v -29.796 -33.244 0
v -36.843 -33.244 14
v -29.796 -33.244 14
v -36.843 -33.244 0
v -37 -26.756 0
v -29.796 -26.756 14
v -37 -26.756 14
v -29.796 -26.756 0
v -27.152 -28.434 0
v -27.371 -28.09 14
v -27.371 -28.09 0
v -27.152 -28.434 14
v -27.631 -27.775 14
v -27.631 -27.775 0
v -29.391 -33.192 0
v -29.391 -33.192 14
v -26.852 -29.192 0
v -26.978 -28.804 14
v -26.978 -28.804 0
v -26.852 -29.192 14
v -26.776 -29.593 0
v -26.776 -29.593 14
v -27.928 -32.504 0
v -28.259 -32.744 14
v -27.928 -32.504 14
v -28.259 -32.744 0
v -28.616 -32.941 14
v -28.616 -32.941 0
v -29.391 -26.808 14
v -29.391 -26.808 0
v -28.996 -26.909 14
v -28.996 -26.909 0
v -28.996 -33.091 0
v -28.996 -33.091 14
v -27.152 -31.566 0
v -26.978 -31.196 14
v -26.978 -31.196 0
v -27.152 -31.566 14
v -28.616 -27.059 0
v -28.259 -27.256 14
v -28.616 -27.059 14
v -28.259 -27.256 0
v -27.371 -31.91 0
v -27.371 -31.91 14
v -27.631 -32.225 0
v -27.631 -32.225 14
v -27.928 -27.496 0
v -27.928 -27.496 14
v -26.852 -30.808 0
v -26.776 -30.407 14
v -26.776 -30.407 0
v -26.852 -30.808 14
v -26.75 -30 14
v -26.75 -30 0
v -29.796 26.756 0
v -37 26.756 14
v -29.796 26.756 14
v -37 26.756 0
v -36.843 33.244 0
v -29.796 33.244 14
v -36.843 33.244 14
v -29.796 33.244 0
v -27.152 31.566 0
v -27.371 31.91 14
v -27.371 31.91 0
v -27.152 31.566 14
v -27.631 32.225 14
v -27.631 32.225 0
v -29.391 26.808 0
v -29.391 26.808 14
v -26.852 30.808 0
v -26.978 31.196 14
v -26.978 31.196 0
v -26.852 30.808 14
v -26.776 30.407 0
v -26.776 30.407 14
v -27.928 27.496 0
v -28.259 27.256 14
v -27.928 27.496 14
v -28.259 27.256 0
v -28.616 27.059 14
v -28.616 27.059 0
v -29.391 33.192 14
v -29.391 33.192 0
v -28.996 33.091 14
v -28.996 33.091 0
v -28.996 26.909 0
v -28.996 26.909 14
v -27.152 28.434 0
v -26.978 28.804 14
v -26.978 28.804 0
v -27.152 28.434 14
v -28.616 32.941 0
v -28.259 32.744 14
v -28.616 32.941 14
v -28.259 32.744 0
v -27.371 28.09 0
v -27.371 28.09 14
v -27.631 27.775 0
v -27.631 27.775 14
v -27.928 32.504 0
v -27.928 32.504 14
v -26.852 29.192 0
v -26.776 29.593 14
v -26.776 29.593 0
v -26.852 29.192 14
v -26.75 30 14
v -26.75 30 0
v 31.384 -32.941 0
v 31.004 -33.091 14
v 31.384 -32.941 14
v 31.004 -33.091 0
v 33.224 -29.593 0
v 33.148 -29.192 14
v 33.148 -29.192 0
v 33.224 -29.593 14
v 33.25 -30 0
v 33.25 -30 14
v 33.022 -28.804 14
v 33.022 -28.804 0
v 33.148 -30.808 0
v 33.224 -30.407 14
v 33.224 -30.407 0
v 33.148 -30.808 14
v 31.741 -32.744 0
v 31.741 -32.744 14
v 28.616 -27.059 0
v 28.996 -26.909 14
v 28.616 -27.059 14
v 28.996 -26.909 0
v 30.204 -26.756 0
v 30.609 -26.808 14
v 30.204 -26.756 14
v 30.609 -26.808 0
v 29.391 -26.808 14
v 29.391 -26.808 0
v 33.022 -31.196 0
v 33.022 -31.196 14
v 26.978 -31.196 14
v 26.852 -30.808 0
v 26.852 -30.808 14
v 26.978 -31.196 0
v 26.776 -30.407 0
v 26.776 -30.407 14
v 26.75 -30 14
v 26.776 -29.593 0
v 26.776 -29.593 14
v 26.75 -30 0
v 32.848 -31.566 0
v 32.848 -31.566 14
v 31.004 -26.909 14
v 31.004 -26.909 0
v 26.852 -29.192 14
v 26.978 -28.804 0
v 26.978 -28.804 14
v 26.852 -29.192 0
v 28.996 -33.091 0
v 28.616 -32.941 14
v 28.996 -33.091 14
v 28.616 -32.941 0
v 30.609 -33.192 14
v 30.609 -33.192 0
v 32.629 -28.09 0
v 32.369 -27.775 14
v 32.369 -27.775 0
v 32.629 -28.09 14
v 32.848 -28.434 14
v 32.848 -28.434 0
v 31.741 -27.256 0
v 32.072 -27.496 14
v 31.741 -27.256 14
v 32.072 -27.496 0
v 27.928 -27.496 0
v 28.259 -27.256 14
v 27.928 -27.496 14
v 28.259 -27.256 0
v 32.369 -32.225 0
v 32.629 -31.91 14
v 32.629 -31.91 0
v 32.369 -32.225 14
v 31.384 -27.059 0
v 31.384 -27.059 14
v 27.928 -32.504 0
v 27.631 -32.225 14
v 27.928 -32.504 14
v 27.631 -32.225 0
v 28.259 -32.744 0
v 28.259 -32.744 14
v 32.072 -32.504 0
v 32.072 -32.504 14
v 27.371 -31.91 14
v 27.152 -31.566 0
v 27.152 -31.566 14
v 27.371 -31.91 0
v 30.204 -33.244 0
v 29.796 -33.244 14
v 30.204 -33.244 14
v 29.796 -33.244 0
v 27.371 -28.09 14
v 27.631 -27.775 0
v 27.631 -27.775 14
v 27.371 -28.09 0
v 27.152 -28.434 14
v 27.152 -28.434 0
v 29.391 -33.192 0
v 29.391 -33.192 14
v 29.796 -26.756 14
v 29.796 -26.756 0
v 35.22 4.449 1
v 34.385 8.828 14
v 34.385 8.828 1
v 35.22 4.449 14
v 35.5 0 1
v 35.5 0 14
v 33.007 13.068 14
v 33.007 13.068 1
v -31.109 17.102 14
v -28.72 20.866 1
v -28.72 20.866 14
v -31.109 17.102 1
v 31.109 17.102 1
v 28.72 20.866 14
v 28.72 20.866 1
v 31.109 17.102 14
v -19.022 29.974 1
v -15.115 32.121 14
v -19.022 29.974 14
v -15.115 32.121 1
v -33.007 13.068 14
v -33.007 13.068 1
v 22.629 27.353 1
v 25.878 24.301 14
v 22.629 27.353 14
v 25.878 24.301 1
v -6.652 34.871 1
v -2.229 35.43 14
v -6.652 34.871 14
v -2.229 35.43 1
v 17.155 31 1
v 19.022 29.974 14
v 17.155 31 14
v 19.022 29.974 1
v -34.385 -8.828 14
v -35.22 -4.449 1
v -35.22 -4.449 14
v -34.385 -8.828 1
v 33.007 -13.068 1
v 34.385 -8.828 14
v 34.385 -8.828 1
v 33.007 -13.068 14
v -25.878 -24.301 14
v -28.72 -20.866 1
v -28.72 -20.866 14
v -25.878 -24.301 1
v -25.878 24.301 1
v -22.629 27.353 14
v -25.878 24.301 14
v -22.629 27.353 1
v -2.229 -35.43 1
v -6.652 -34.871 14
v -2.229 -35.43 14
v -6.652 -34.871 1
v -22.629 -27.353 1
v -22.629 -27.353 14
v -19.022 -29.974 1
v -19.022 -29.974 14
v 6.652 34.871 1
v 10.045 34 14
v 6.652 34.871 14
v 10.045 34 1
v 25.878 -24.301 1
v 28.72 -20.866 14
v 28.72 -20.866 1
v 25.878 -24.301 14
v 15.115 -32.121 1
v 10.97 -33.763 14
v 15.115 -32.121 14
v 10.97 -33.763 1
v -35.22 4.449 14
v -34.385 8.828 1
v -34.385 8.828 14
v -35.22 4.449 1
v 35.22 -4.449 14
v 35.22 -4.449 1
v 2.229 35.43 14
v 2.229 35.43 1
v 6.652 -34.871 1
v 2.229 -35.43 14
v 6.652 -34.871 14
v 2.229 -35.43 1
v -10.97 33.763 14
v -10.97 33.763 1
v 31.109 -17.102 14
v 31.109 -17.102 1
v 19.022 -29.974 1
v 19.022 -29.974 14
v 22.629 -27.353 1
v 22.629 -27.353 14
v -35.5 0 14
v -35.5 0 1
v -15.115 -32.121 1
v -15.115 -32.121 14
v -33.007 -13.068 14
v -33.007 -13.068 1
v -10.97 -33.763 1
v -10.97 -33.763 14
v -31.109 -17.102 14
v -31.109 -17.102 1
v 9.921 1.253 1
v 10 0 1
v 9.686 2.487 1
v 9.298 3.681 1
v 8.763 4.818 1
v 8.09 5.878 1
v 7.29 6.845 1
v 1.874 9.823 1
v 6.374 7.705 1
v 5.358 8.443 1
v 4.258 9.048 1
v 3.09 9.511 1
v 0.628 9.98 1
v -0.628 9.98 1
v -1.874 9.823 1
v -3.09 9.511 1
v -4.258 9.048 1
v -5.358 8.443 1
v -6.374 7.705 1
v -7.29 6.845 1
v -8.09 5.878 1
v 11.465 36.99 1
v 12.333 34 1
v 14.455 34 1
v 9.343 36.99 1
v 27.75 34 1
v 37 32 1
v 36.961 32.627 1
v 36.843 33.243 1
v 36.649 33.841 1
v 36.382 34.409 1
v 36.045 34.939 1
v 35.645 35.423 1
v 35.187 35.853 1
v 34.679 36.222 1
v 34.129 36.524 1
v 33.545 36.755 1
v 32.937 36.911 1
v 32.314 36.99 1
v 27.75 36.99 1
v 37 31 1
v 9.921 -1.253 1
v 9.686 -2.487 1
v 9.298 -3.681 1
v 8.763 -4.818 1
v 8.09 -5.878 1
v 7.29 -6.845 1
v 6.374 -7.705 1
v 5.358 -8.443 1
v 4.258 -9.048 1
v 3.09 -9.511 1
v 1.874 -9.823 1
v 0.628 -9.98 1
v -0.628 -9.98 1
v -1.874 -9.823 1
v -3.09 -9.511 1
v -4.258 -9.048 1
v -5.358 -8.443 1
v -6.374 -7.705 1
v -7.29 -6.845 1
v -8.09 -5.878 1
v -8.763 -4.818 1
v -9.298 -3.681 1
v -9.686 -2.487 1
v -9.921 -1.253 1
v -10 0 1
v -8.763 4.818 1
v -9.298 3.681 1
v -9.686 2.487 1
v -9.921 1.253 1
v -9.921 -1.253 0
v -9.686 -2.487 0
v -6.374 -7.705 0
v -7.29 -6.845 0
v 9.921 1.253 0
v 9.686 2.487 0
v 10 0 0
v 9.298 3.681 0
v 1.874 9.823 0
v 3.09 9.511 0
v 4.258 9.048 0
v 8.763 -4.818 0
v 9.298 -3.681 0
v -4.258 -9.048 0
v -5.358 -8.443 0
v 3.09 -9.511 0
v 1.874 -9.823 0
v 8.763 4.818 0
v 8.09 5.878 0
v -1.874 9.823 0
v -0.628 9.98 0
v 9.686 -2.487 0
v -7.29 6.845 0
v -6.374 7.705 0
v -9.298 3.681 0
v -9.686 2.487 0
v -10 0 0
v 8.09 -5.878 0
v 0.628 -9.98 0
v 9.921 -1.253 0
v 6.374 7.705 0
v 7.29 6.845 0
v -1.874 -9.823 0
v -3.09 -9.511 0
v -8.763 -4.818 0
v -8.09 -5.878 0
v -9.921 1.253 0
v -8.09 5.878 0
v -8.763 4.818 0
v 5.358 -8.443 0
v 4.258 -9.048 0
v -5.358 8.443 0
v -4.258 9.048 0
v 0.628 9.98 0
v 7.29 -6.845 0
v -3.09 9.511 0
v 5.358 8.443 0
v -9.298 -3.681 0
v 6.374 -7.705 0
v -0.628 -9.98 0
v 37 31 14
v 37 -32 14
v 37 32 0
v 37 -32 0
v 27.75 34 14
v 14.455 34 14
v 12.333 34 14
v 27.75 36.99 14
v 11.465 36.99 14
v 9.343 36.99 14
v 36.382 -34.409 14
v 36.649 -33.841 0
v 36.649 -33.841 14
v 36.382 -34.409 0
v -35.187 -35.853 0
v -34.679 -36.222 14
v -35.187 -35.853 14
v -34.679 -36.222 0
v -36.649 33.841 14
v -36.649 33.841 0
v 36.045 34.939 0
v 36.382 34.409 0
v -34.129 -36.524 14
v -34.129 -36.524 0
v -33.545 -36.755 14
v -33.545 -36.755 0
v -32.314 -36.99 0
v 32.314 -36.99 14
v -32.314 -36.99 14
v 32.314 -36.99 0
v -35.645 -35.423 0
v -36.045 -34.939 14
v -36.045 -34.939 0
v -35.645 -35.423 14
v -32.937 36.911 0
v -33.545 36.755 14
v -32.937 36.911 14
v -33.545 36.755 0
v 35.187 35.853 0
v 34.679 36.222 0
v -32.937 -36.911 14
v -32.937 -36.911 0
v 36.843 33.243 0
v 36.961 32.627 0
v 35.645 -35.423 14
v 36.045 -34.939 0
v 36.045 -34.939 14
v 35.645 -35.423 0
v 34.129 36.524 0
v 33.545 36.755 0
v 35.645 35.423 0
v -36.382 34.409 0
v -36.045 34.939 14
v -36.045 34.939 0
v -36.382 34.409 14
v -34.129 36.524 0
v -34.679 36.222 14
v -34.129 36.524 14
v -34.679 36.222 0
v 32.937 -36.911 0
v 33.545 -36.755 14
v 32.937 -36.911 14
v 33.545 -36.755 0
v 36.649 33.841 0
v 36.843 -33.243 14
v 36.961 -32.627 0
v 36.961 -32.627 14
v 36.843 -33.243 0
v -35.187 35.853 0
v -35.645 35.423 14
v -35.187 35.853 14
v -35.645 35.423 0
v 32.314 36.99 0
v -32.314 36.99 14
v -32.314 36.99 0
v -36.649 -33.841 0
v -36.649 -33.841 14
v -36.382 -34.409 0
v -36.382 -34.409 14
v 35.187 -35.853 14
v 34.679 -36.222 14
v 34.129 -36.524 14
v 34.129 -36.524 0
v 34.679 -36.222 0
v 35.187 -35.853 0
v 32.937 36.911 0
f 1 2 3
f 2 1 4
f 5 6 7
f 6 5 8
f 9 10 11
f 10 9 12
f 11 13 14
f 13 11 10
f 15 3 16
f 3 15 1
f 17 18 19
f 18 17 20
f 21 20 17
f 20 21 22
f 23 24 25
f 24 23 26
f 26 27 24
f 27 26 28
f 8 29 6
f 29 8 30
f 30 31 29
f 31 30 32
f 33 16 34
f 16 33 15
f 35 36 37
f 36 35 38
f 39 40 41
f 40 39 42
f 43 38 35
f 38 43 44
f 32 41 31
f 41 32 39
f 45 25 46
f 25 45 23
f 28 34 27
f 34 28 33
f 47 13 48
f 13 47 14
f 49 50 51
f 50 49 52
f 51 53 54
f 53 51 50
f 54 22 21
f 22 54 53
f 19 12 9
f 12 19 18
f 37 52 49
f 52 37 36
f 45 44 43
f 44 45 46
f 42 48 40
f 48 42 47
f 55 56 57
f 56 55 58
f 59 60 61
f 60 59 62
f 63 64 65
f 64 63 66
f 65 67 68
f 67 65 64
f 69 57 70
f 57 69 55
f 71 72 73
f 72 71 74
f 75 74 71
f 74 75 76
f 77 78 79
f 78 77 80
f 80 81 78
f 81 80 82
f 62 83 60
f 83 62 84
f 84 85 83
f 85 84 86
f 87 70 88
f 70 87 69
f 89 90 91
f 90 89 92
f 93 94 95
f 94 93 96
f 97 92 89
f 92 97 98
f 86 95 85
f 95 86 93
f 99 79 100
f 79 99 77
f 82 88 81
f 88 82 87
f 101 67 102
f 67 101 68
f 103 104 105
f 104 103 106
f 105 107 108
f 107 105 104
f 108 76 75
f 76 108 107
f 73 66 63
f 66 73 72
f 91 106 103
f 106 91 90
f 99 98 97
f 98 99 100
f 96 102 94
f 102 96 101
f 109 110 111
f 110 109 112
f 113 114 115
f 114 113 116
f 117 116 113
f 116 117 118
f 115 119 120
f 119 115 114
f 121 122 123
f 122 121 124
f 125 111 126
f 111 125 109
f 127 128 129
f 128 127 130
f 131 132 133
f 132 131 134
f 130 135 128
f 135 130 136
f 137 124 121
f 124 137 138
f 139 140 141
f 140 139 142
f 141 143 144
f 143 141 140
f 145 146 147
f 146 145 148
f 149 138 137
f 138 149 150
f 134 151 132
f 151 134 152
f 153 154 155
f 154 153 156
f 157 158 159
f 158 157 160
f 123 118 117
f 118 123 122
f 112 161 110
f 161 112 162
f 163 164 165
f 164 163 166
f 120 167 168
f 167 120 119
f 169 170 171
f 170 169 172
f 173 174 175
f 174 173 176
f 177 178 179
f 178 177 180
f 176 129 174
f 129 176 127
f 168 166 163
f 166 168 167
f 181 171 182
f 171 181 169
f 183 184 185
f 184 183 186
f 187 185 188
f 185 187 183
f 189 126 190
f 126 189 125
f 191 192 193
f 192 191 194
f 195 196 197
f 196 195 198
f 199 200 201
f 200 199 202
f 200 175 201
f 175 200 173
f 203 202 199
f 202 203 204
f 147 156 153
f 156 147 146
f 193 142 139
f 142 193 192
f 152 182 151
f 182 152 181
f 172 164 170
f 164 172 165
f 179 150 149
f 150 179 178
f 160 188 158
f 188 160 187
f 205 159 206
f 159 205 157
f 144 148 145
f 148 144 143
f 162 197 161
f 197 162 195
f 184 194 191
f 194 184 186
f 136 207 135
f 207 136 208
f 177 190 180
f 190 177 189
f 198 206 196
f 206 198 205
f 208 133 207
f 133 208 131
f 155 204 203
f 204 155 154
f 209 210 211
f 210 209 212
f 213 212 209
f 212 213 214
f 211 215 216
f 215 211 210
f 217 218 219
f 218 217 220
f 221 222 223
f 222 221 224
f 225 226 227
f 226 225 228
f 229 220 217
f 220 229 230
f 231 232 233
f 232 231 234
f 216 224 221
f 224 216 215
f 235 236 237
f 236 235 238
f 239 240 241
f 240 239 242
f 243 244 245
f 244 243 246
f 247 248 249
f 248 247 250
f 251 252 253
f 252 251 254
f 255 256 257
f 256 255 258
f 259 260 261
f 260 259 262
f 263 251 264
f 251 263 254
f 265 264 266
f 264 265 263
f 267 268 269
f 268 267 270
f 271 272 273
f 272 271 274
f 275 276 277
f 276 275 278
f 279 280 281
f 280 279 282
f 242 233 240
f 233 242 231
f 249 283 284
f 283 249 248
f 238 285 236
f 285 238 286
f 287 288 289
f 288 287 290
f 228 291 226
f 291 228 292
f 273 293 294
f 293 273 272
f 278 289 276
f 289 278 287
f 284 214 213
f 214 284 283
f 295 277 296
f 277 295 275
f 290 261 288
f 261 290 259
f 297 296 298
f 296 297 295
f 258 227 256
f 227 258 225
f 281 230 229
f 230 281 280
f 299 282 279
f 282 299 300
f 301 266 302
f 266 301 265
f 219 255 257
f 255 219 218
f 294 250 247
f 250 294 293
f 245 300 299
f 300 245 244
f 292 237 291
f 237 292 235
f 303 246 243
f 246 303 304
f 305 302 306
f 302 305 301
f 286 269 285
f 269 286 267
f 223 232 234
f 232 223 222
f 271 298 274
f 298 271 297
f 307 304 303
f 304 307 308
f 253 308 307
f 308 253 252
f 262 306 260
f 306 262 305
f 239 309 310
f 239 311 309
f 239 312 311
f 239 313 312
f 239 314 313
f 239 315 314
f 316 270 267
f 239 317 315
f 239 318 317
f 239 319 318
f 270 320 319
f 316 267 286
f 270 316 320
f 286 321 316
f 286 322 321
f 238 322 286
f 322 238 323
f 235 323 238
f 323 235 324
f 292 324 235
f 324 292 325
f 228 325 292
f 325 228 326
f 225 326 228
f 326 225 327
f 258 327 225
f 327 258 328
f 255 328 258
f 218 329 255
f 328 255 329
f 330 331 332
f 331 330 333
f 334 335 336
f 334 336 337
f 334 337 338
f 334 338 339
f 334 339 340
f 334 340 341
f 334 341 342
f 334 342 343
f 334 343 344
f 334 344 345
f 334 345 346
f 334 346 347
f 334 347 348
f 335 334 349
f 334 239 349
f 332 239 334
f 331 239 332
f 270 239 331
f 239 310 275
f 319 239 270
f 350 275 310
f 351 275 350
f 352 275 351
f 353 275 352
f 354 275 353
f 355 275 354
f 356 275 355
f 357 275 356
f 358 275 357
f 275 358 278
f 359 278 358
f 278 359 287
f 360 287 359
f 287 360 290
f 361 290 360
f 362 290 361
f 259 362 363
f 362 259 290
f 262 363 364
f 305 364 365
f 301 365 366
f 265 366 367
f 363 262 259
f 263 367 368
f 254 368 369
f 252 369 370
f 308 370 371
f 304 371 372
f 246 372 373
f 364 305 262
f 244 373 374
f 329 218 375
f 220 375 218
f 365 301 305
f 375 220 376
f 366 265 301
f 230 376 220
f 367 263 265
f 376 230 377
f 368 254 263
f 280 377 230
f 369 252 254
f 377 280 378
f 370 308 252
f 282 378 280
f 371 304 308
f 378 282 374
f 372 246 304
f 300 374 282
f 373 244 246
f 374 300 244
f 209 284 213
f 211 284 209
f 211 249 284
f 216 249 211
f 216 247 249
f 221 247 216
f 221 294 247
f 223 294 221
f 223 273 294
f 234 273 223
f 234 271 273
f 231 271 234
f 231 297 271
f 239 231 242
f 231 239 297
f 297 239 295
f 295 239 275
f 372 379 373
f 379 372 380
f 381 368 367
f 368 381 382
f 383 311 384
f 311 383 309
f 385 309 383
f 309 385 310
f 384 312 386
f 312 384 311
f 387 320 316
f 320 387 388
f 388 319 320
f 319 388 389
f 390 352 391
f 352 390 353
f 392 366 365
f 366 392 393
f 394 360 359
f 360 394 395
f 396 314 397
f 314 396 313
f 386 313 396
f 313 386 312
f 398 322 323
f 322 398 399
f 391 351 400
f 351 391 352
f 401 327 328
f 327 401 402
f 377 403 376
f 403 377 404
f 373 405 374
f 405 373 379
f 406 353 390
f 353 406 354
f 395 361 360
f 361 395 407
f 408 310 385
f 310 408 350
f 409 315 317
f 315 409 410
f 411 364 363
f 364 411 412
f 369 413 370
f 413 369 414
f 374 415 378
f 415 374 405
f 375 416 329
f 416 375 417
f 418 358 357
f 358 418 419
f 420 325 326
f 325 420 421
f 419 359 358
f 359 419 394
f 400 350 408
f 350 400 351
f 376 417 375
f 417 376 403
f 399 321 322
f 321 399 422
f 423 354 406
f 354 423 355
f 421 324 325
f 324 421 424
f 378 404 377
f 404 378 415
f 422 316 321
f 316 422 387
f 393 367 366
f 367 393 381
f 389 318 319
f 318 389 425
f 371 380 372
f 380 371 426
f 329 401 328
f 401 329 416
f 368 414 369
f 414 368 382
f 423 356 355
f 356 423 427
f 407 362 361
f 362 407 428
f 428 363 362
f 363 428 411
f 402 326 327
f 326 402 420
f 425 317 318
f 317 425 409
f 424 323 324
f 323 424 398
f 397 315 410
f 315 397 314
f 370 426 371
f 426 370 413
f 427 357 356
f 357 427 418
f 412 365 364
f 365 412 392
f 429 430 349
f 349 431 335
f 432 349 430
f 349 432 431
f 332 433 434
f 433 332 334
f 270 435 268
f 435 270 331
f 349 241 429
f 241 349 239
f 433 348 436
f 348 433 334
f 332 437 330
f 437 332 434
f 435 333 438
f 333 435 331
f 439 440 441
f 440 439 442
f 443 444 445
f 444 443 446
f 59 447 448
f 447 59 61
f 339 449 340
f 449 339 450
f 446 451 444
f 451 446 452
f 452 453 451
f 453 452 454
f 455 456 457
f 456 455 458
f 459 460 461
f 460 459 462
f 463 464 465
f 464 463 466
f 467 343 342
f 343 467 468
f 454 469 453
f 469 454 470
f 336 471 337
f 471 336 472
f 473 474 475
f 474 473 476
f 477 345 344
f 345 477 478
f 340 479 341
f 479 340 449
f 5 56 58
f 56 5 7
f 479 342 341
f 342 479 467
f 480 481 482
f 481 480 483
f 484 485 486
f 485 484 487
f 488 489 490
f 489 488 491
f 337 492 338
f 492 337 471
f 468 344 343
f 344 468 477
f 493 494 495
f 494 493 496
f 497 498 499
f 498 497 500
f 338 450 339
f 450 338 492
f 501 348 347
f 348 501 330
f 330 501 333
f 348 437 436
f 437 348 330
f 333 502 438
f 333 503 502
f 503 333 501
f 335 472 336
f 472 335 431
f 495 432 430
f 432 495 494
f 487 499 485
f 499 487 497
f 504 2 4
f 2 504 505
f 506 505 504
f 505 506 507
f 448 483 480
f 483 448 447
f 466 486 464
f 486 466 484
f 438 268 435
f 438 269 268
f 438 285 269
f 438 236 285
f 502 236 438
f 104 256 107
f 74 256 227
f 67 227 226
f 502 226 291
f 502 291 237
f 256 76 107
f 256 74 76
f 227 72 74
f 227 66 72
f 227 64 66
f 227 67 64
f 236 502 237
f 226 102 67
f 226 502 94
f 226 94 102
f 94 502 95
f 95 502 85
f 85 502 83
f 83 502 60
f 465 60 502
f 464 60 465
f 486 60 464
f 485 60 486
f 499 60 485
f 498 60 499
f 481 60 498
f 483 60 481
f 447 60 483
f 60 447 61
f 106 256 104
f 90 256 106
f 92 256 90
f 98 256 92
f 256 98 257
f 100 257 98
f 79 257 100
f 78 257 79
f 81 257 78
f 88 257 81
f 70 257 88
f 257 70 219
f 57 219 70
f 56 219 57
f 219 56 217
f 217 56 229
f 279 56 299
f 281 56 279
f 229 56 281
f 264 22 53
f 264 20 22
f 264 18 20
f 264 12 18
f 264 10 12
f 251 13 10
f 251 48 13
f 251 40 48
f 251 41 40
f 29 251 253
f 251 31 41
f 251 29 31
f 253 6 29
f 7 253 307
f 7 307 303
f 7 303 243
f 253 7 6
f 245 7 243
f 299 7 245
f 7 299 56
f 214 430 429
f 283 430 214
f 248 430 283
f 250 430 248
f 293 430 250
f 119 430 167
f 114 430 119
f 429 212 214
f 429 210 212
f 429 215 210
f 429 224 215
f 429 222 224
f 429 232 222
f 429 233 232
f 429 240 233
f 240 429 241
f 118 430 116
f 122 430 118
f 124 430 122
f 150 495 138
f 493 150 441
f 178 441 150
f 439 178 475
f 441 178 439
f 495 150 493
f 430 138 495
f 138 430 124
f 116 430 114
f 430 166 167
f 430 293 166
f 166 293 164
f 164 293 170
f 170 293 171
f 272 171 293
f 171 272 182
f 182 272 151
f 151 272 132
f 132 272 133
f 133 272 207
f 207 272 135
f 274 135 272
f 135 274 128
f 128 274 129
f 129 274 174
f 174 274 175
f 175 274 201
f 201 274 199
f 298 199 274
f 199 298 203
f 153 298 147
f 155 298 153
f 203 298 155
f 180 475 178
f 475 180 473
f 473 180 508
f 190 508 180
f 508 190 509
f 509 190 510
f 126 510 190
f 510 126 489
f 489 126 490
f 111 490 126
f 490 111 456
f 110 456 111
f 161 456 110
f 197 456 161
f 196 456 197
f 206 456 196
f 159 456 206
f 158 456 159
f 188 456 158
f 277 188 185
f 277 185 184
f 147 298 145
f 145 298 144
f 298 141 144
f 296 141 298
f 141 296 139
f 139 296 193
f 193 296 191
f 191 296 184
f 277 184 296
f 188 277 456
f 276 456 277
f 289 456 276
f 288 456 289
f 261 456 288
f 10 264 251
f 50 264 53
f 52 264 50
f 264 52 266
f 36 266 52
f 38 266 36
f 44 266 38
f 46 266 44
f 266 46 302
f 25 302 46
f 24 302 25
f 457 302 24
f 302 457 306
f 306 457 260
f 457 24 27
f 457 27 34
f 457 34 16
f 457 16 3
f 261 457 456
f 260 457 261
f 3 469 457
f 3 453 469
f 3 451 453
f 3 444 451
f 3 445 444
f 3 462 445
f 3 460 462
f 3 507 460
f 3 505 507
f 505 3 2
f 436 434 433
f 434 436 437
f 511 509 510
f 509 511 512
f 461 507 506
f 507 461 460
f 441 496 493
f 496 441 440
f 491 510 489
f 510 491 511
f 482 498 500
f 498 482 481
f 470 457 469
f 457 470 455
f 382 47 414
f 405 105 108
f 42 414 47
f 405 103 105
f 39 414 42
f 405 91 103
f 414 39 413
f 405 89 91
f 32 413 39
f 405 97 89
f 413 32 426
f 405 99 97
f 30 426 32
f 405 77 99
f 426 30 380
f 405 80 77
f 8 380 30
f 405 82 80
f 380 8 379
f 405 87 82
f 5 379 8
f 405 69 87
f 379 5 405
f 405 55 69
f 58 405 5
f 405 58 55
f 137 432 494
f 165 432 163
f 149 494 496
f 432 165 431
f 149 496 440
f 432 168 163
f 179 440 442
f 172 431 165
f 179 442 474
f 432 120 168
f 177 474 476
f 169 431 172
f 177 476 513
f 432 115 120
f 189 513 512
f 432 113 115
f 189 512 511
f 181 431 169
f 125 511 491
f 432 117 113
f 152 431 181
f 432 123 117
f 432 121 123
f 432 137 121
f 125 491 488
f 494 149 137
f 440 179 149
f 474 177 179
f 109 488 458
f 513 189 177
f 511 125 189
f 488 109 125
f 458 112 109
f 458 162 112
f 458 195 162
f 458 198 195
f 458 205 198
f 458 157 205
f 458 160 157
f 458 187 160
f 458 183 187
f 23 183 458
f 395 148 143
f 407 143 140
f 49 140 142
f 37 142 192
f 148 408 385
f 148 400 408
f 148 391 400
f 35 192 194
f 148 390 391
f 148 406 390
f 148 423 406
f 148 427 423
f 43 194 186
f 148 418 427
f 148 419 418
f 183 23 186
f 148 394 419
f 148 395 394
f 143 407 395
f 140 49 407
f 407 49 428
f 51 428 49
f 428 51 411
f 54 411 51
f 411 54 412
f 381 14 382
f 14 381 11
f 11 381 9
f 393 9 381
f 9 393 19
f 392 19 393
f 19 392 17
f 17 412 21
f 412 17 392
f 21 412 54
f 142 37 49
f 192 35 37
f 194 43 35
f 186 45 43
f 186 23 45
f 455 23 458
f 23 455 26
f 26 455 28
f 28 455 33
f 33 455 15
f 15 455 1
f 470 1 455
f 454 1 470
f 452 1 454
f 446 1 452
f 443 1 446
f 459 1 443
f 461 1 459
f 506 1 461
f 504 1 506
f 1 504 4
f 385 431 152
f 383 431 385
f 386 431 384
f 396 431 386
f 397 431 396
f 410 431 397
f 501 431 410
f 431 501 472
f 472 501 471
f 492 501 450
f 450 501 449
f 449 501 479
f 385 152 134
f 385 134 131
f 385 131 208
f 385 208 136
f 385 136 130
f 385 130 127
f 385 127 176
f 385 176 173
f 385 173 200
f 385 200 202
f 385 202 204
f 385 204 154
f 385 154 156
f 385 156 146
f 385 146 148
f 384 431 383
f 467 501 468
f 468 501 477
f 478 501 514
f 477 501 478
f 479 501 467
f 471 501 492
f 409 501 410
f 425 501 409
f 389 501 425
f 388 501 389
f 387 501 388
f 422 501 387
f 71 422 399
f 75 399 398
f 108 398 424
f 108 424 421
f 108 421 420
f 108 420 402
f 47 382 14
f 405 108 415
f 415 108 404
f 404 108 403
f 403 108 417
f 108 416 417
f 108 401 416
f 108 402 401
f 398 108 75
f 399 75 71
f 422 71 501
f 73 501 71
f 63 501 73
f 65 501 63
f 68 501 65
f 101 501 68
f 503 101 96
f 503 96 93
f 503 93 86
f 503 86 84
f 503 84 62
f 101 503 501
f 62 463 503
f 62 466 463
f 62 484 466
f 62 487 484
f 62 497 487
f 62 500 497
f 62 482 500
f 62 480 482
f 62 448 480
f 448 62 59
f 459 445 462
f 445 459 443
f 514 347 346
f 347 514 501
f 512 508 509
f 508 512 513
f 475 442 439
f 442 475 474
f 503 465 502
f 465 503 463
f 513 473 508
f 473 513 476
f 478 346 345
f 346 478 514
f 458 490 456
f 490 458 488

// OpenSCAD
$fn = 50;


difference() {
	union() {
		translate(v = [0, 0, 0]) {
			rotate(a = [0, 0, 0]) {
				hull() {
					translate(v = [-32.0000000000, 32.0000000000, 0]) {
						rotate(a = [0, 0, 0]) {
							translate(v = [0, 0, 0]) {
								rotate(a = [0, 0, 0]) {
									cylinder(h = 14, r = 5);
								}
							}
						}
					}
					translate(v = [32.0000000000, 32.0000000000, 0]) {
						rotate(a = [0, 0, 0]) {
							translate(v = [0, 0, 0]) {
								rotate(a = [0, 0, 0]) {
									cylinder(h = 14, r = 5);
								}
							}
						}
					}
					translate(v = [-32.0000000000, -32.0000000000, 0]) {
						rotate(a = [0, 0, 0]) {
							translate(v = [0, 0, 0]) {
								rotate(a = [0, 0, 0]) {
									cylinder(h = 14, r = 5);
								}
							}
						}
					}
					translate(v = [32.0000000000, -32.0000000000, 0]) {
						rotate(a = [0, 0, 0]) {
							translate(v = [0, 0, 0]) {
								rotate(a = [0, 0, 0]) {
									cylinder(h = 14, r = 5);
								}
							}
						}
					}
				}
			}
		}
	}
	union() {
		translate(v = [-37.5000000000, -30.0000000000, -125]) {
			rotate(a = [0, 0, 0]) {
				hull() {
					translate(v = [7.5000000000, 0, 0]) {
						rotate(a = [0, 0, 0]) {
							translate(v = [0, 0, 0]) {
								rotate(a = [0, 0, 0]) {
									cylinder(h = 250, r = 3.2500000000);
								}
							}
						}
					}
					translate(v = [-7.5000000000, 0, 0]) {
						rotate(a = [0, 0, 0]) {
							translate(v = [0, 0, 0]) {
								rotate(a = [0, 0, 0]) {
									cylinder(h = 250, r = 3.2500000000);
								}
							}
						}
					}
				}
			}
		}
		translate(v = [-37.5000000000, 30.0000000000, -125]) {
			rotate(a = [0, 0, 0]) {
				hull() {
					translate(v = [7.5000000000, 0, 0]) {
						rotate(a = [0, 0, 0]) {
							translate(v = [0, 0, 0]) {
								rotate(a = [0, 0, 0]) {
									cylinder(h = 250, r = 3.2500000000);
								}
							}
						}
					}
					translate(v = [-7.5000000000, 0, 0]) {
						rotate(a = [0, 0, 0]) {
							translate(v = [0, 0, 0]) {
								rotate(a = [0, 0, 0]) {
									cylinder(h = 250, r = 3.2500000000);
								}
							}
						}
					}
				}
			}
		}
		translate(v = [30.0000000000, -30.0000000000, -125.0000000000]) {
			rotate(a = [0, 0, 0]) {
				cylinder(h = 250, r = 3.2500000000);
			}
		}
		translate(v = [0, 0, 1.0000000000]) {
			rotate(a = [0, 0, 0]) {
				cylinder(h = 16, r = 35.5000000000);
			}
		}
		translate(v = [0, 0, -7.0000000000]) {
			rotate(a = [0, 0, 0]) {
				cylinder(h = 14, r = 10.0000000000);
			}
		}
		translate(v = [0.0000000000, 31.0000000000, 1]) {
			rotate(a = [0, 0, 0]) {
				cube(size = [37.0000000000, 3, 16]);
			}
		}
		translate(v = [27.7500000000, 31.0000000000, 1]) {
			rotate(a = [0, 0, 0]) {
				cube(size = [9.2500000000, 6, 16]);
			}
		}
		translate(v = [8.5833333333, 37.7500000000, 1]) {
			rotate(a = [0, 0, -45]) {
				cube(size = [7.5000000000, 1.5000000000, 16]);
			}
		}
	}
}
